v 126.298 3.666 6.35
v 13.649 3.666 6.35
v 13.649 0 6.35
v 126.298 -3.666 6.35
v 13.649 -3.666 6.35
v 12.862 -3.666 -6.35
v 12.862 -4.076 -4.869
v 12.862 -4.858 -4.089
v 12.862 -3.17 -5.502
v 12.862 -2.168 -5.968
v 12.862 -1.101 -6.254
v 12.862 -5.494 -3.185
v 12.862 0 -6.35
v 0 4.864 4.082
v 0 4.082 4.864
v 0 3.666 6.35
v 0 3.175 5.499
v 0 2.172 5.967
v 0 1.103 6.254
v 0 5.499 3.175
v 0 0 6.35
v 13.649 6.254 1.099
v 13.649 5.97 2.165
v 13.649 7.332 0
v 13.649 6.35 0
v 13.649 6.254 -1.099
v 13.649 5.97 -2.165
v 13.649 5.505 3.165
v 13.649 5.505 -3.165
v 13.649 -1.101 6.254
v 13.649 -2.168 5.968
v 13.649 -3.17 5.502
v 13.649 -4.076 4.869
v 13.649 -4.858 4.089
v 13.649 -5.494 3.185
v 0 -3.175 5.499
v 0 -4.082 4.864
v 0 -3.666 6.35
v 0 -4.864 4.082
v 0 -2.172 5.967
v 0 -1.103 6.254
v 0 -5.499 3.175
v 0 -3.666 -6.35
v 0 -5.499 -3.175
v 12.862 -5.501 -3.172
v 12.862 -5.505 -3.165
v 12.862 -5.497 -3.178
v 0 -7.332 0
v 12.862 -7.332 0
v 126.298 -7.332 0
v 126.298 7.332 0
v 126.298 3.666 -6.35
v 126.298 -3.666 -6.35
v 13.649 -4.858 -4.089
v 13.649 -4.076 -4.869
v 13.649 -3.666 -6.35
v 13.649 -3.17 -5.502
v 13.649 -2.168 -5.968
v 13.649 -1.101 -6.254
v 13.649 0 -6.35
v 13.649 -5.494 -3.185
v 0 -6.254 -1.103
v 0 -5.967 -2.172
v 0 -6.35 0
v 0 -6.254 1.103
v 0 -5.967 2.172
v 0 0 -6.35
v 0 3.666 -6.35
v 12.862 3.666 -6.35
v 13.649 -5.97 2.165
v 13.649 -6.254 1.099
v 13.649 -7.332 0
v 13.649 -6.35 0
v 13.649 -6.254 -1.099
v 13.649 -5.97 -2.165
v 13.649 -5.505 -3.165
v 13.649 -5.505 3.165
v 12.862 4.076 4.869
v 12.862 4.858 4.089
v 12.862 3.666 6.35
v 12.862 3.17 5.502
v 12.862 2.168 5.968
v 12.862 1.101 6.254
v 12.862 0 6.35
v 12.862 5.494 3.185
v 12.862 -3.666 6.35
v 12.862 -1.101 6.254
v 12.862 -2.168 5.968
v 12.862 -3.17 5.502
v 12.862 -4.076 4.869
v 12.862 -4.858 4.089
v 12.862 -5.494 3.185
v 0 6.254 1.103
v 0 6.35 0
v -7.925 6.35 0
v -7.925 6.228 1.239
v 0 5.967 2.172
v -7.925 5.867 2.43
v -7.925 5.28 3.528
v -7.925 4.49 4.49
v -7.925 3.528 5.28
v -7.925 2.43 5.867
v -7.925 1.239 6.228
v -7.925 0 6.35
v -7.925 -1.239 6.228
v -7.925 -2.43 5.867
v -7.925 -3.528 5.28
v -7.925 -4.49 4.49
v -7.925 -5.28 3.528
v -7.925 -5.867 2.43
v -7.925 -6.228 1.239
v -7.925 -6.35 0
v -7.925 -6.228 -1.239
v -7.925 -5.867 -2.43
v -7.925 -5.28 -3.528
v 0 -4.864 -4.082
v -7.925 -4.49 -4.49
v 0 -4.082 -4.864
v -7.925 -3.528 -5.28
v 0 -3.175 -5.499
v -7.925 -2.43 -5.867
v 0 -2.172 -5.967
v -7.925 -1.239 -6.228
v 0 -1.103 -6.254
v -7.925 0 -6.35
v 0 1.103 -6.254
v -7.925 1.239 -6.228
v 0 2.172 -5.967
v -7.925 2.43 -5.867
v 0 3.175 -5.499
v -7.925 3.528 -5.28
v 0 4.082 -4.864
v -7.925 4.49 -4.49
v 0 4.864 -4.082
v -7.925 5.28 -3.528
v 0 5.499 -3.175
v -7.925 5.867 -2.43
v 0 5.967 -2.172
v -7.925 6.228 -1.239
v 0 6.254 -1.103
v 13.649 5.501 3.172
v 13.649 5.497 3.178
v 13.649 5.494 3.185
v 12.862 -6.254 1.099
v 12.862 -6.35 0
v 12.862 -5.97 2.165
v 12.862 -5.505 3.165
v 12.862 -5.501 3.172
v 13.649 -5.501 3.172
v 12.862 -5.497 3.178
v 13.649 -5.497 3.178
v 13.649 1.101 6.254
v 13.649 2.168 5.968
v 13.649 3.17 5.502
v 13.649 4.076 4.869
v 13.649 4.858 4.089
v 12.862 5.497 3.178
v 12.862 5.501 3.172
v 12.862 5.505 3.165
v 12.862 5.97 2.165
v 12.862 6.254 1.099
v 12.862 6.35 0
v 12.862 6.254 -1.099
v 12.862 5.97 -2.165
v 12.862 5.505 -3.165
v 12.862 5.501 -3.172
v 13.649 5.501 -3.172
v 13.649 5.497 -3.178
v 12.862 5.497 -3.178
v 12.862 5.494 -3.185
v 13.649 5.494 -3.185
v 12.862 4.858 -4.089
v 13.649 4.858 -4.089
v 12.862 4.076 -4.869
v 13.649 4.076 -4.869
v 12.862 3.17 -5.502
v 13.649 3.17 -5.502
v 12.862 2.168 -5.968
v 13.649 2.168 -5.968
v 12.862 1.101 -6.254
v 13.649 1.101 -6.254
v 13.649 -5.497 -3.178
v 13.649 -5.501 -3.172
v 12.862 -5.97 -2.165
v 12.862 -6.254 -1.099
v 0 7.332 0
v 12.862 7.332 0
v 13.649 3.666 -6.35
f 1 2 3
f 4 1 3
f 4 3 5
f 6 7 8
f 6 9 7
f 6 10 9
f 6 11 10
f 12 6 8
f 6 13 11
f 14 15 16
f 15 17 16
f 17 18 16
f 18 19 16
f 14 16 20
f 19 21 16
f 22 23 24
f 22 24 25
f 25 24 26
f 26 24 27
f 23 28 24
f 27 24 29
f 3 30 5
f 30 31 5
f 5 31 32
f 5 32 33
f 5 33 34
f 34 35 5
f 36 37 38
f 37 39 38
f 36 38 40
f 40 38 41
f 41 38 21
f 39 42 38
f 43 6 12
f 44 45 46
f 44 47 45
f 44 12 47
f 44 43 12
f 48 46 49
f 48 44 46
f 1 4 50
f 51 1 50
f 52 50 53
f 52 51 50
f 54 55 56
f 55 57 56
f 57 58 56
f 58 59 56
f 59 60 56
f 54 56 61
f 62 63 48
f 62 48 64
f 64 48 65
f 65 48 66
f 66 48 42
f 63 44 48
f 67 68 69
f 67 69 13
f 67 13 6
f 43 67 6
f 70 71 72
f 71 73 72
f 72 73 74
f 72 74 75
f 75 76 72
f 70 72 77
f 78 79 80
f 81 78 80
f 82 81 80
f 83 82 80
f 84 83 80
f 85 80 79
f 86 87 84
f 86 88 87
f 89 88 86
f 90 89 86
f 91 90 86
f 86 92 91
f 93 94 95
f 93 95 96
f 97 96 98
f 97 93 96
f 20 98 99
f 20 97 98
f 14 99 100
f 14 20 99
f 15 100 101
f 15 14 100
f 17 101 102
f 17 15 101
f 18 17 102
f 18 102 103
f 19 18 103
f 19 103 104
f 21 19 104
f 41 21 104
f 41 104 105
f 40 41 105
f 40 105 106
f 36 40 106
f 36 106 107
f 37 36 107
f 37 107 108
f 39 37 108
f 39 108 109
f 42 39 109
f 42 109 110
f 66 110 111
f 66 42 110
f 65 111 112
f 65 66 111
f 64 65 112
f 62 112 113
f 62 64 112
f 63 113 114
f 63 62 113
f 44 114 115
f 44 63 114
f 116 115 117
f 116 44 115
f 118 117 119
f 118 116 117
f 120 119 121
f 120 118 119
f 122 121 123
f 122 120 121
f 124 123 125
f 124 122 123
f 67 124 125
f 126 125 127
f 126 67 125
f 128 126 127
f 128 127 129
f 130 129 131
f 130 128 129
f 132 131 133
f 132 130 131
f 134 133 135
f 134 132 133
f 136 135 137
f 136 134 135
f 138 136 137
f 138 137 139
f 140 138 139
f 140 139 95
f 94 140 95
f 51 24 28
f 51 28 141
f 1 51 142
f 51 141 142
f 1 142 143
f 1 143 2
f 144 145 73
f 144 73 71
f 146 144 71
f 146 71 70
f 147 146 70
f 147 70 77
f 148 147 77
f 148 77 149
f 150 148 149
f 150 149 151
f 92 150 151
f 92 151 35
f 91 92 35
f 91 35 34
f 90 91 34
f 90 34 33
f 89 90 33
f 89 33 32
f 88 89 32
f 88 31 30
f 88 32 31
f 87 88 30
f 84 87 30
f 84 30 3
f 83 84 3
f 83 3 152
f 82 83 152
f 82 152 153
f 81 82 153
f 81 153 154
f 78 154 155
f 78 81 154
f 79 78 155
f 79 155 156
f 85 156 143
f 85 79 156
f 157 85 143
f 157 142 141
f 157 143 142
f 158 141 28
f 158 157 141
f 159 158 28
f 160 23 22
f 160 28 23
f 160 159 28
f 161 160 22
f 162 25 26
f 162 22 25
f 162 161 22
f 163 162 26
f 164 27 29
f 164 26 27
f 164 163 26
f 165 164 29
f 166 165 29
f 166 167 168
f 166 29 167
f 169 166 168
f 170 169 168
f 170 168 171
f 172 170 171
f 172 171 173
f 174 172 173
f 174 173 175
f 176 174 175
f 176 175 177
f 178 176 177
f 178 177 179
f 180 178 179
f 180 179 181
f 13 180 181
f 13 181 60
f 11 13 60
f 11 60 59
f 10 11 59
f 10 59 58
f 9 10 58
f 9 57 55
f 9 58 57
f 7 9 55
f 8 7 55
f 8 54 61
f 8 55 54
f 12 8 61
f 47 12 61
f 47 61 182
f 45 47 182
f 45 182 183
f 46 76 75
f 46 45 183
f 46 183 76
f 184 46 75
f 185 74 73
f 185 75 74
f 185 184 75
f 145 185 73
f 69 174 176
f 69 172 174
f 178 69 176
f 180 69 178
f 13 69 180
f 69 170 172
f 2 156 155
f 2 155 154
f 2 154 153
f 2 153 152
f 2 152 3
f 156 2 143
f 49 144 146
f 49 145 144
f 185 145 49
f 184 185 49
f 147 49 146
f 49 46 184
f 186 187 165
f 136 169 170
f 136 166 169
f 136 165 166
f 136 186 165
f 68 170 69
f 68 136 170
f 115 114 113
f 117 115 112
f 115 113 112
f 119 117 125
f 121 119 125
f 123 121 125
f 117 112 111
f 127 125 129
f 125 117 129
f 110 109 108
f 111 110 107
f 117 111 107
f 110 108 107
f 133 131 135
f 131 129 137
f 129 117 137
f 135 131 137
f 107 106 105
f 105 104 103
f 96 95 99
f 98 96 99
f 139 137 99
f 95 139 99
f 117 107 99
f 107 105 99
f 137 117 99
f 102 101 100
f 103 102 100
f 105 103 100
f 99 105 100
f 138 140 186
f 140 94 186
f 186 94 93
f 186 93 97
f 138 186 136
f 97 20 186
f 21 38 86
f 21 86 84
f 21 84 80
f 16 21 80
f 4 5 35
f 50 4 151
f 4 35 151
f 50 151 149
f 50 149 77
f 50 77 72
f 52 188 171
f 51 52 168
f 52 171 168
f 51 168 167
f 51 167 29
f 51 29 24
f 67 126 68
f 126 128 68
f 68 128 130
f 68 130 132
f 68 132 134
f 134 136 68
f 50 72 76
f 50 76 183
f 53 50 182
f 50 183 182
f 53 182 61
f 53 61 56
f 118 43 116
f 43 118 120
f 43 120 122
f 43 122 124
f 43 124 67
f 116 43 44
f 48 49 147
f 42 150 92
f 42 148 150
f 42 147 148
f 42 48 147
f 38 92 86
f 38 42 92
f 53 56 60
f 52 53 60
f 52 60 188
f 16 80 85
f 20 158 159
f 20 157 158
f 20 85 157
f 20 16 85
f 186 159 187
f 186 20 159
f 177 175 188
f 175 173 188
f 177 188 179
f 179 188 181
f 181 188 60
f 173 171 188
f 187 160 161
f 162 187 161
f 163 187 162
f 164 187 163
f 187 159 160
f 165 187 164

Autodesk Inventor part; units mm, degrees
ref_plane "YZ Plane" through (0, 0, 0) normal (1, 0, 0) x (0, 1, 0)
ref_plane "XZ Plane" through (0, 0, 0) normal (0, 1, 0) x (-1, 0, 0)
ref_plane "XY Plane" through (0, 0, 0) normal (0, 0, 1) x (1, 0, 0)
sketch "Sketch1" plane through (0, 0, 0) normal (1, 0, 0) x (0, 1, 0)
  line L0 (7.3323, 0) -> (3.6662, -6.35)
  line L1 (3.6662, -6.35) -> (-3.6662, -6.35)
  line L2 (-3.6662, -6.35) -> (-7.3323, 0)
  line L3 (-7.3323, 0) -> (-3.6662, 6.35)
  line L4 (-3.6662, 6.35) -> (3.6662, 6.35)
  line L5 (3.6662, 6.35) -> (7.3323, 0)
  circle A0 centre (0, 0) radius 6.35
  dimension "d0" = 12.7
extrude "Extrusion1" add sketch "Sketch1" along normal blind 26.2984
extrude "Extrusion2" add sketch "Sketch1" against normal blind 7.9248 contours A0
ref_plane "Work Plane1" through (0, 7.3323, 0) normal (0, 0, -1) x (1, 0, 0)
sketch "Sketch2" plane through (0, 7.3323, 0) normal (0, 0, -1) x (1, 0, 0)
  line L0 (0, 13.6823) -> (-7.9248, 13.6823) projected
  line L1 (0, 10.9985) -> (0, 14.6647) projected
  line L2 (0, 14.6647) -> (26.2984, 14.6647) projected
  line L3 (12.8618, 14.6647) -> (13.6492, 14.6647)
  line L4 (13.6492, 14.6647) -> (13.6492, 13.6823)
  line L5 (13.6492, 13.6823) -> (12.8618, 13.6823)
  line L6 (12.8618, 13.6823) -> (12.8618, 14.6647)
  line L7 (0, 7.3323) -> (26.2984, 7.3323)
  line L8 (26.2984, 3.6662) -> (26.2984, 10.9985) projected
  line L9 (26.2984, 14.6647) -> (26.2984, 10.9985) projected
  dimension "d7" = 0.7874
  dimension "d9" = 12.6492
revolve "Revolution1" cut sketch "Sketch2" angle 360 about axis through (0, 0, 0) along (1, 0, 0)
sketch "Sketch3" plane through (26.2984, 0, 0) normal (1, 0, 0) x (0, 0, -1)
  line L0 (6.35, 3.6662) -> (0, 7.3323) projected
  line L1 (0, 7.3323) -> (-6.35, 3.6662) projected
  line L2 (-6.35, 3.6662) -> (-6.35, -3.6662) projected
  line L3 (-6.35, -3.6662) -> (0, -7.3323) projected
  line L4 (0, -7.3323) -> (6.35, -3.6662) projected
  line L5 (6.35, -3.6662) -> (6.35, 3.6662) projected
  point P0 (0, 0)
extrude "Extrusion3" add sketch "Sketch3" along normal blind 100
properties part number "LongShaft"
